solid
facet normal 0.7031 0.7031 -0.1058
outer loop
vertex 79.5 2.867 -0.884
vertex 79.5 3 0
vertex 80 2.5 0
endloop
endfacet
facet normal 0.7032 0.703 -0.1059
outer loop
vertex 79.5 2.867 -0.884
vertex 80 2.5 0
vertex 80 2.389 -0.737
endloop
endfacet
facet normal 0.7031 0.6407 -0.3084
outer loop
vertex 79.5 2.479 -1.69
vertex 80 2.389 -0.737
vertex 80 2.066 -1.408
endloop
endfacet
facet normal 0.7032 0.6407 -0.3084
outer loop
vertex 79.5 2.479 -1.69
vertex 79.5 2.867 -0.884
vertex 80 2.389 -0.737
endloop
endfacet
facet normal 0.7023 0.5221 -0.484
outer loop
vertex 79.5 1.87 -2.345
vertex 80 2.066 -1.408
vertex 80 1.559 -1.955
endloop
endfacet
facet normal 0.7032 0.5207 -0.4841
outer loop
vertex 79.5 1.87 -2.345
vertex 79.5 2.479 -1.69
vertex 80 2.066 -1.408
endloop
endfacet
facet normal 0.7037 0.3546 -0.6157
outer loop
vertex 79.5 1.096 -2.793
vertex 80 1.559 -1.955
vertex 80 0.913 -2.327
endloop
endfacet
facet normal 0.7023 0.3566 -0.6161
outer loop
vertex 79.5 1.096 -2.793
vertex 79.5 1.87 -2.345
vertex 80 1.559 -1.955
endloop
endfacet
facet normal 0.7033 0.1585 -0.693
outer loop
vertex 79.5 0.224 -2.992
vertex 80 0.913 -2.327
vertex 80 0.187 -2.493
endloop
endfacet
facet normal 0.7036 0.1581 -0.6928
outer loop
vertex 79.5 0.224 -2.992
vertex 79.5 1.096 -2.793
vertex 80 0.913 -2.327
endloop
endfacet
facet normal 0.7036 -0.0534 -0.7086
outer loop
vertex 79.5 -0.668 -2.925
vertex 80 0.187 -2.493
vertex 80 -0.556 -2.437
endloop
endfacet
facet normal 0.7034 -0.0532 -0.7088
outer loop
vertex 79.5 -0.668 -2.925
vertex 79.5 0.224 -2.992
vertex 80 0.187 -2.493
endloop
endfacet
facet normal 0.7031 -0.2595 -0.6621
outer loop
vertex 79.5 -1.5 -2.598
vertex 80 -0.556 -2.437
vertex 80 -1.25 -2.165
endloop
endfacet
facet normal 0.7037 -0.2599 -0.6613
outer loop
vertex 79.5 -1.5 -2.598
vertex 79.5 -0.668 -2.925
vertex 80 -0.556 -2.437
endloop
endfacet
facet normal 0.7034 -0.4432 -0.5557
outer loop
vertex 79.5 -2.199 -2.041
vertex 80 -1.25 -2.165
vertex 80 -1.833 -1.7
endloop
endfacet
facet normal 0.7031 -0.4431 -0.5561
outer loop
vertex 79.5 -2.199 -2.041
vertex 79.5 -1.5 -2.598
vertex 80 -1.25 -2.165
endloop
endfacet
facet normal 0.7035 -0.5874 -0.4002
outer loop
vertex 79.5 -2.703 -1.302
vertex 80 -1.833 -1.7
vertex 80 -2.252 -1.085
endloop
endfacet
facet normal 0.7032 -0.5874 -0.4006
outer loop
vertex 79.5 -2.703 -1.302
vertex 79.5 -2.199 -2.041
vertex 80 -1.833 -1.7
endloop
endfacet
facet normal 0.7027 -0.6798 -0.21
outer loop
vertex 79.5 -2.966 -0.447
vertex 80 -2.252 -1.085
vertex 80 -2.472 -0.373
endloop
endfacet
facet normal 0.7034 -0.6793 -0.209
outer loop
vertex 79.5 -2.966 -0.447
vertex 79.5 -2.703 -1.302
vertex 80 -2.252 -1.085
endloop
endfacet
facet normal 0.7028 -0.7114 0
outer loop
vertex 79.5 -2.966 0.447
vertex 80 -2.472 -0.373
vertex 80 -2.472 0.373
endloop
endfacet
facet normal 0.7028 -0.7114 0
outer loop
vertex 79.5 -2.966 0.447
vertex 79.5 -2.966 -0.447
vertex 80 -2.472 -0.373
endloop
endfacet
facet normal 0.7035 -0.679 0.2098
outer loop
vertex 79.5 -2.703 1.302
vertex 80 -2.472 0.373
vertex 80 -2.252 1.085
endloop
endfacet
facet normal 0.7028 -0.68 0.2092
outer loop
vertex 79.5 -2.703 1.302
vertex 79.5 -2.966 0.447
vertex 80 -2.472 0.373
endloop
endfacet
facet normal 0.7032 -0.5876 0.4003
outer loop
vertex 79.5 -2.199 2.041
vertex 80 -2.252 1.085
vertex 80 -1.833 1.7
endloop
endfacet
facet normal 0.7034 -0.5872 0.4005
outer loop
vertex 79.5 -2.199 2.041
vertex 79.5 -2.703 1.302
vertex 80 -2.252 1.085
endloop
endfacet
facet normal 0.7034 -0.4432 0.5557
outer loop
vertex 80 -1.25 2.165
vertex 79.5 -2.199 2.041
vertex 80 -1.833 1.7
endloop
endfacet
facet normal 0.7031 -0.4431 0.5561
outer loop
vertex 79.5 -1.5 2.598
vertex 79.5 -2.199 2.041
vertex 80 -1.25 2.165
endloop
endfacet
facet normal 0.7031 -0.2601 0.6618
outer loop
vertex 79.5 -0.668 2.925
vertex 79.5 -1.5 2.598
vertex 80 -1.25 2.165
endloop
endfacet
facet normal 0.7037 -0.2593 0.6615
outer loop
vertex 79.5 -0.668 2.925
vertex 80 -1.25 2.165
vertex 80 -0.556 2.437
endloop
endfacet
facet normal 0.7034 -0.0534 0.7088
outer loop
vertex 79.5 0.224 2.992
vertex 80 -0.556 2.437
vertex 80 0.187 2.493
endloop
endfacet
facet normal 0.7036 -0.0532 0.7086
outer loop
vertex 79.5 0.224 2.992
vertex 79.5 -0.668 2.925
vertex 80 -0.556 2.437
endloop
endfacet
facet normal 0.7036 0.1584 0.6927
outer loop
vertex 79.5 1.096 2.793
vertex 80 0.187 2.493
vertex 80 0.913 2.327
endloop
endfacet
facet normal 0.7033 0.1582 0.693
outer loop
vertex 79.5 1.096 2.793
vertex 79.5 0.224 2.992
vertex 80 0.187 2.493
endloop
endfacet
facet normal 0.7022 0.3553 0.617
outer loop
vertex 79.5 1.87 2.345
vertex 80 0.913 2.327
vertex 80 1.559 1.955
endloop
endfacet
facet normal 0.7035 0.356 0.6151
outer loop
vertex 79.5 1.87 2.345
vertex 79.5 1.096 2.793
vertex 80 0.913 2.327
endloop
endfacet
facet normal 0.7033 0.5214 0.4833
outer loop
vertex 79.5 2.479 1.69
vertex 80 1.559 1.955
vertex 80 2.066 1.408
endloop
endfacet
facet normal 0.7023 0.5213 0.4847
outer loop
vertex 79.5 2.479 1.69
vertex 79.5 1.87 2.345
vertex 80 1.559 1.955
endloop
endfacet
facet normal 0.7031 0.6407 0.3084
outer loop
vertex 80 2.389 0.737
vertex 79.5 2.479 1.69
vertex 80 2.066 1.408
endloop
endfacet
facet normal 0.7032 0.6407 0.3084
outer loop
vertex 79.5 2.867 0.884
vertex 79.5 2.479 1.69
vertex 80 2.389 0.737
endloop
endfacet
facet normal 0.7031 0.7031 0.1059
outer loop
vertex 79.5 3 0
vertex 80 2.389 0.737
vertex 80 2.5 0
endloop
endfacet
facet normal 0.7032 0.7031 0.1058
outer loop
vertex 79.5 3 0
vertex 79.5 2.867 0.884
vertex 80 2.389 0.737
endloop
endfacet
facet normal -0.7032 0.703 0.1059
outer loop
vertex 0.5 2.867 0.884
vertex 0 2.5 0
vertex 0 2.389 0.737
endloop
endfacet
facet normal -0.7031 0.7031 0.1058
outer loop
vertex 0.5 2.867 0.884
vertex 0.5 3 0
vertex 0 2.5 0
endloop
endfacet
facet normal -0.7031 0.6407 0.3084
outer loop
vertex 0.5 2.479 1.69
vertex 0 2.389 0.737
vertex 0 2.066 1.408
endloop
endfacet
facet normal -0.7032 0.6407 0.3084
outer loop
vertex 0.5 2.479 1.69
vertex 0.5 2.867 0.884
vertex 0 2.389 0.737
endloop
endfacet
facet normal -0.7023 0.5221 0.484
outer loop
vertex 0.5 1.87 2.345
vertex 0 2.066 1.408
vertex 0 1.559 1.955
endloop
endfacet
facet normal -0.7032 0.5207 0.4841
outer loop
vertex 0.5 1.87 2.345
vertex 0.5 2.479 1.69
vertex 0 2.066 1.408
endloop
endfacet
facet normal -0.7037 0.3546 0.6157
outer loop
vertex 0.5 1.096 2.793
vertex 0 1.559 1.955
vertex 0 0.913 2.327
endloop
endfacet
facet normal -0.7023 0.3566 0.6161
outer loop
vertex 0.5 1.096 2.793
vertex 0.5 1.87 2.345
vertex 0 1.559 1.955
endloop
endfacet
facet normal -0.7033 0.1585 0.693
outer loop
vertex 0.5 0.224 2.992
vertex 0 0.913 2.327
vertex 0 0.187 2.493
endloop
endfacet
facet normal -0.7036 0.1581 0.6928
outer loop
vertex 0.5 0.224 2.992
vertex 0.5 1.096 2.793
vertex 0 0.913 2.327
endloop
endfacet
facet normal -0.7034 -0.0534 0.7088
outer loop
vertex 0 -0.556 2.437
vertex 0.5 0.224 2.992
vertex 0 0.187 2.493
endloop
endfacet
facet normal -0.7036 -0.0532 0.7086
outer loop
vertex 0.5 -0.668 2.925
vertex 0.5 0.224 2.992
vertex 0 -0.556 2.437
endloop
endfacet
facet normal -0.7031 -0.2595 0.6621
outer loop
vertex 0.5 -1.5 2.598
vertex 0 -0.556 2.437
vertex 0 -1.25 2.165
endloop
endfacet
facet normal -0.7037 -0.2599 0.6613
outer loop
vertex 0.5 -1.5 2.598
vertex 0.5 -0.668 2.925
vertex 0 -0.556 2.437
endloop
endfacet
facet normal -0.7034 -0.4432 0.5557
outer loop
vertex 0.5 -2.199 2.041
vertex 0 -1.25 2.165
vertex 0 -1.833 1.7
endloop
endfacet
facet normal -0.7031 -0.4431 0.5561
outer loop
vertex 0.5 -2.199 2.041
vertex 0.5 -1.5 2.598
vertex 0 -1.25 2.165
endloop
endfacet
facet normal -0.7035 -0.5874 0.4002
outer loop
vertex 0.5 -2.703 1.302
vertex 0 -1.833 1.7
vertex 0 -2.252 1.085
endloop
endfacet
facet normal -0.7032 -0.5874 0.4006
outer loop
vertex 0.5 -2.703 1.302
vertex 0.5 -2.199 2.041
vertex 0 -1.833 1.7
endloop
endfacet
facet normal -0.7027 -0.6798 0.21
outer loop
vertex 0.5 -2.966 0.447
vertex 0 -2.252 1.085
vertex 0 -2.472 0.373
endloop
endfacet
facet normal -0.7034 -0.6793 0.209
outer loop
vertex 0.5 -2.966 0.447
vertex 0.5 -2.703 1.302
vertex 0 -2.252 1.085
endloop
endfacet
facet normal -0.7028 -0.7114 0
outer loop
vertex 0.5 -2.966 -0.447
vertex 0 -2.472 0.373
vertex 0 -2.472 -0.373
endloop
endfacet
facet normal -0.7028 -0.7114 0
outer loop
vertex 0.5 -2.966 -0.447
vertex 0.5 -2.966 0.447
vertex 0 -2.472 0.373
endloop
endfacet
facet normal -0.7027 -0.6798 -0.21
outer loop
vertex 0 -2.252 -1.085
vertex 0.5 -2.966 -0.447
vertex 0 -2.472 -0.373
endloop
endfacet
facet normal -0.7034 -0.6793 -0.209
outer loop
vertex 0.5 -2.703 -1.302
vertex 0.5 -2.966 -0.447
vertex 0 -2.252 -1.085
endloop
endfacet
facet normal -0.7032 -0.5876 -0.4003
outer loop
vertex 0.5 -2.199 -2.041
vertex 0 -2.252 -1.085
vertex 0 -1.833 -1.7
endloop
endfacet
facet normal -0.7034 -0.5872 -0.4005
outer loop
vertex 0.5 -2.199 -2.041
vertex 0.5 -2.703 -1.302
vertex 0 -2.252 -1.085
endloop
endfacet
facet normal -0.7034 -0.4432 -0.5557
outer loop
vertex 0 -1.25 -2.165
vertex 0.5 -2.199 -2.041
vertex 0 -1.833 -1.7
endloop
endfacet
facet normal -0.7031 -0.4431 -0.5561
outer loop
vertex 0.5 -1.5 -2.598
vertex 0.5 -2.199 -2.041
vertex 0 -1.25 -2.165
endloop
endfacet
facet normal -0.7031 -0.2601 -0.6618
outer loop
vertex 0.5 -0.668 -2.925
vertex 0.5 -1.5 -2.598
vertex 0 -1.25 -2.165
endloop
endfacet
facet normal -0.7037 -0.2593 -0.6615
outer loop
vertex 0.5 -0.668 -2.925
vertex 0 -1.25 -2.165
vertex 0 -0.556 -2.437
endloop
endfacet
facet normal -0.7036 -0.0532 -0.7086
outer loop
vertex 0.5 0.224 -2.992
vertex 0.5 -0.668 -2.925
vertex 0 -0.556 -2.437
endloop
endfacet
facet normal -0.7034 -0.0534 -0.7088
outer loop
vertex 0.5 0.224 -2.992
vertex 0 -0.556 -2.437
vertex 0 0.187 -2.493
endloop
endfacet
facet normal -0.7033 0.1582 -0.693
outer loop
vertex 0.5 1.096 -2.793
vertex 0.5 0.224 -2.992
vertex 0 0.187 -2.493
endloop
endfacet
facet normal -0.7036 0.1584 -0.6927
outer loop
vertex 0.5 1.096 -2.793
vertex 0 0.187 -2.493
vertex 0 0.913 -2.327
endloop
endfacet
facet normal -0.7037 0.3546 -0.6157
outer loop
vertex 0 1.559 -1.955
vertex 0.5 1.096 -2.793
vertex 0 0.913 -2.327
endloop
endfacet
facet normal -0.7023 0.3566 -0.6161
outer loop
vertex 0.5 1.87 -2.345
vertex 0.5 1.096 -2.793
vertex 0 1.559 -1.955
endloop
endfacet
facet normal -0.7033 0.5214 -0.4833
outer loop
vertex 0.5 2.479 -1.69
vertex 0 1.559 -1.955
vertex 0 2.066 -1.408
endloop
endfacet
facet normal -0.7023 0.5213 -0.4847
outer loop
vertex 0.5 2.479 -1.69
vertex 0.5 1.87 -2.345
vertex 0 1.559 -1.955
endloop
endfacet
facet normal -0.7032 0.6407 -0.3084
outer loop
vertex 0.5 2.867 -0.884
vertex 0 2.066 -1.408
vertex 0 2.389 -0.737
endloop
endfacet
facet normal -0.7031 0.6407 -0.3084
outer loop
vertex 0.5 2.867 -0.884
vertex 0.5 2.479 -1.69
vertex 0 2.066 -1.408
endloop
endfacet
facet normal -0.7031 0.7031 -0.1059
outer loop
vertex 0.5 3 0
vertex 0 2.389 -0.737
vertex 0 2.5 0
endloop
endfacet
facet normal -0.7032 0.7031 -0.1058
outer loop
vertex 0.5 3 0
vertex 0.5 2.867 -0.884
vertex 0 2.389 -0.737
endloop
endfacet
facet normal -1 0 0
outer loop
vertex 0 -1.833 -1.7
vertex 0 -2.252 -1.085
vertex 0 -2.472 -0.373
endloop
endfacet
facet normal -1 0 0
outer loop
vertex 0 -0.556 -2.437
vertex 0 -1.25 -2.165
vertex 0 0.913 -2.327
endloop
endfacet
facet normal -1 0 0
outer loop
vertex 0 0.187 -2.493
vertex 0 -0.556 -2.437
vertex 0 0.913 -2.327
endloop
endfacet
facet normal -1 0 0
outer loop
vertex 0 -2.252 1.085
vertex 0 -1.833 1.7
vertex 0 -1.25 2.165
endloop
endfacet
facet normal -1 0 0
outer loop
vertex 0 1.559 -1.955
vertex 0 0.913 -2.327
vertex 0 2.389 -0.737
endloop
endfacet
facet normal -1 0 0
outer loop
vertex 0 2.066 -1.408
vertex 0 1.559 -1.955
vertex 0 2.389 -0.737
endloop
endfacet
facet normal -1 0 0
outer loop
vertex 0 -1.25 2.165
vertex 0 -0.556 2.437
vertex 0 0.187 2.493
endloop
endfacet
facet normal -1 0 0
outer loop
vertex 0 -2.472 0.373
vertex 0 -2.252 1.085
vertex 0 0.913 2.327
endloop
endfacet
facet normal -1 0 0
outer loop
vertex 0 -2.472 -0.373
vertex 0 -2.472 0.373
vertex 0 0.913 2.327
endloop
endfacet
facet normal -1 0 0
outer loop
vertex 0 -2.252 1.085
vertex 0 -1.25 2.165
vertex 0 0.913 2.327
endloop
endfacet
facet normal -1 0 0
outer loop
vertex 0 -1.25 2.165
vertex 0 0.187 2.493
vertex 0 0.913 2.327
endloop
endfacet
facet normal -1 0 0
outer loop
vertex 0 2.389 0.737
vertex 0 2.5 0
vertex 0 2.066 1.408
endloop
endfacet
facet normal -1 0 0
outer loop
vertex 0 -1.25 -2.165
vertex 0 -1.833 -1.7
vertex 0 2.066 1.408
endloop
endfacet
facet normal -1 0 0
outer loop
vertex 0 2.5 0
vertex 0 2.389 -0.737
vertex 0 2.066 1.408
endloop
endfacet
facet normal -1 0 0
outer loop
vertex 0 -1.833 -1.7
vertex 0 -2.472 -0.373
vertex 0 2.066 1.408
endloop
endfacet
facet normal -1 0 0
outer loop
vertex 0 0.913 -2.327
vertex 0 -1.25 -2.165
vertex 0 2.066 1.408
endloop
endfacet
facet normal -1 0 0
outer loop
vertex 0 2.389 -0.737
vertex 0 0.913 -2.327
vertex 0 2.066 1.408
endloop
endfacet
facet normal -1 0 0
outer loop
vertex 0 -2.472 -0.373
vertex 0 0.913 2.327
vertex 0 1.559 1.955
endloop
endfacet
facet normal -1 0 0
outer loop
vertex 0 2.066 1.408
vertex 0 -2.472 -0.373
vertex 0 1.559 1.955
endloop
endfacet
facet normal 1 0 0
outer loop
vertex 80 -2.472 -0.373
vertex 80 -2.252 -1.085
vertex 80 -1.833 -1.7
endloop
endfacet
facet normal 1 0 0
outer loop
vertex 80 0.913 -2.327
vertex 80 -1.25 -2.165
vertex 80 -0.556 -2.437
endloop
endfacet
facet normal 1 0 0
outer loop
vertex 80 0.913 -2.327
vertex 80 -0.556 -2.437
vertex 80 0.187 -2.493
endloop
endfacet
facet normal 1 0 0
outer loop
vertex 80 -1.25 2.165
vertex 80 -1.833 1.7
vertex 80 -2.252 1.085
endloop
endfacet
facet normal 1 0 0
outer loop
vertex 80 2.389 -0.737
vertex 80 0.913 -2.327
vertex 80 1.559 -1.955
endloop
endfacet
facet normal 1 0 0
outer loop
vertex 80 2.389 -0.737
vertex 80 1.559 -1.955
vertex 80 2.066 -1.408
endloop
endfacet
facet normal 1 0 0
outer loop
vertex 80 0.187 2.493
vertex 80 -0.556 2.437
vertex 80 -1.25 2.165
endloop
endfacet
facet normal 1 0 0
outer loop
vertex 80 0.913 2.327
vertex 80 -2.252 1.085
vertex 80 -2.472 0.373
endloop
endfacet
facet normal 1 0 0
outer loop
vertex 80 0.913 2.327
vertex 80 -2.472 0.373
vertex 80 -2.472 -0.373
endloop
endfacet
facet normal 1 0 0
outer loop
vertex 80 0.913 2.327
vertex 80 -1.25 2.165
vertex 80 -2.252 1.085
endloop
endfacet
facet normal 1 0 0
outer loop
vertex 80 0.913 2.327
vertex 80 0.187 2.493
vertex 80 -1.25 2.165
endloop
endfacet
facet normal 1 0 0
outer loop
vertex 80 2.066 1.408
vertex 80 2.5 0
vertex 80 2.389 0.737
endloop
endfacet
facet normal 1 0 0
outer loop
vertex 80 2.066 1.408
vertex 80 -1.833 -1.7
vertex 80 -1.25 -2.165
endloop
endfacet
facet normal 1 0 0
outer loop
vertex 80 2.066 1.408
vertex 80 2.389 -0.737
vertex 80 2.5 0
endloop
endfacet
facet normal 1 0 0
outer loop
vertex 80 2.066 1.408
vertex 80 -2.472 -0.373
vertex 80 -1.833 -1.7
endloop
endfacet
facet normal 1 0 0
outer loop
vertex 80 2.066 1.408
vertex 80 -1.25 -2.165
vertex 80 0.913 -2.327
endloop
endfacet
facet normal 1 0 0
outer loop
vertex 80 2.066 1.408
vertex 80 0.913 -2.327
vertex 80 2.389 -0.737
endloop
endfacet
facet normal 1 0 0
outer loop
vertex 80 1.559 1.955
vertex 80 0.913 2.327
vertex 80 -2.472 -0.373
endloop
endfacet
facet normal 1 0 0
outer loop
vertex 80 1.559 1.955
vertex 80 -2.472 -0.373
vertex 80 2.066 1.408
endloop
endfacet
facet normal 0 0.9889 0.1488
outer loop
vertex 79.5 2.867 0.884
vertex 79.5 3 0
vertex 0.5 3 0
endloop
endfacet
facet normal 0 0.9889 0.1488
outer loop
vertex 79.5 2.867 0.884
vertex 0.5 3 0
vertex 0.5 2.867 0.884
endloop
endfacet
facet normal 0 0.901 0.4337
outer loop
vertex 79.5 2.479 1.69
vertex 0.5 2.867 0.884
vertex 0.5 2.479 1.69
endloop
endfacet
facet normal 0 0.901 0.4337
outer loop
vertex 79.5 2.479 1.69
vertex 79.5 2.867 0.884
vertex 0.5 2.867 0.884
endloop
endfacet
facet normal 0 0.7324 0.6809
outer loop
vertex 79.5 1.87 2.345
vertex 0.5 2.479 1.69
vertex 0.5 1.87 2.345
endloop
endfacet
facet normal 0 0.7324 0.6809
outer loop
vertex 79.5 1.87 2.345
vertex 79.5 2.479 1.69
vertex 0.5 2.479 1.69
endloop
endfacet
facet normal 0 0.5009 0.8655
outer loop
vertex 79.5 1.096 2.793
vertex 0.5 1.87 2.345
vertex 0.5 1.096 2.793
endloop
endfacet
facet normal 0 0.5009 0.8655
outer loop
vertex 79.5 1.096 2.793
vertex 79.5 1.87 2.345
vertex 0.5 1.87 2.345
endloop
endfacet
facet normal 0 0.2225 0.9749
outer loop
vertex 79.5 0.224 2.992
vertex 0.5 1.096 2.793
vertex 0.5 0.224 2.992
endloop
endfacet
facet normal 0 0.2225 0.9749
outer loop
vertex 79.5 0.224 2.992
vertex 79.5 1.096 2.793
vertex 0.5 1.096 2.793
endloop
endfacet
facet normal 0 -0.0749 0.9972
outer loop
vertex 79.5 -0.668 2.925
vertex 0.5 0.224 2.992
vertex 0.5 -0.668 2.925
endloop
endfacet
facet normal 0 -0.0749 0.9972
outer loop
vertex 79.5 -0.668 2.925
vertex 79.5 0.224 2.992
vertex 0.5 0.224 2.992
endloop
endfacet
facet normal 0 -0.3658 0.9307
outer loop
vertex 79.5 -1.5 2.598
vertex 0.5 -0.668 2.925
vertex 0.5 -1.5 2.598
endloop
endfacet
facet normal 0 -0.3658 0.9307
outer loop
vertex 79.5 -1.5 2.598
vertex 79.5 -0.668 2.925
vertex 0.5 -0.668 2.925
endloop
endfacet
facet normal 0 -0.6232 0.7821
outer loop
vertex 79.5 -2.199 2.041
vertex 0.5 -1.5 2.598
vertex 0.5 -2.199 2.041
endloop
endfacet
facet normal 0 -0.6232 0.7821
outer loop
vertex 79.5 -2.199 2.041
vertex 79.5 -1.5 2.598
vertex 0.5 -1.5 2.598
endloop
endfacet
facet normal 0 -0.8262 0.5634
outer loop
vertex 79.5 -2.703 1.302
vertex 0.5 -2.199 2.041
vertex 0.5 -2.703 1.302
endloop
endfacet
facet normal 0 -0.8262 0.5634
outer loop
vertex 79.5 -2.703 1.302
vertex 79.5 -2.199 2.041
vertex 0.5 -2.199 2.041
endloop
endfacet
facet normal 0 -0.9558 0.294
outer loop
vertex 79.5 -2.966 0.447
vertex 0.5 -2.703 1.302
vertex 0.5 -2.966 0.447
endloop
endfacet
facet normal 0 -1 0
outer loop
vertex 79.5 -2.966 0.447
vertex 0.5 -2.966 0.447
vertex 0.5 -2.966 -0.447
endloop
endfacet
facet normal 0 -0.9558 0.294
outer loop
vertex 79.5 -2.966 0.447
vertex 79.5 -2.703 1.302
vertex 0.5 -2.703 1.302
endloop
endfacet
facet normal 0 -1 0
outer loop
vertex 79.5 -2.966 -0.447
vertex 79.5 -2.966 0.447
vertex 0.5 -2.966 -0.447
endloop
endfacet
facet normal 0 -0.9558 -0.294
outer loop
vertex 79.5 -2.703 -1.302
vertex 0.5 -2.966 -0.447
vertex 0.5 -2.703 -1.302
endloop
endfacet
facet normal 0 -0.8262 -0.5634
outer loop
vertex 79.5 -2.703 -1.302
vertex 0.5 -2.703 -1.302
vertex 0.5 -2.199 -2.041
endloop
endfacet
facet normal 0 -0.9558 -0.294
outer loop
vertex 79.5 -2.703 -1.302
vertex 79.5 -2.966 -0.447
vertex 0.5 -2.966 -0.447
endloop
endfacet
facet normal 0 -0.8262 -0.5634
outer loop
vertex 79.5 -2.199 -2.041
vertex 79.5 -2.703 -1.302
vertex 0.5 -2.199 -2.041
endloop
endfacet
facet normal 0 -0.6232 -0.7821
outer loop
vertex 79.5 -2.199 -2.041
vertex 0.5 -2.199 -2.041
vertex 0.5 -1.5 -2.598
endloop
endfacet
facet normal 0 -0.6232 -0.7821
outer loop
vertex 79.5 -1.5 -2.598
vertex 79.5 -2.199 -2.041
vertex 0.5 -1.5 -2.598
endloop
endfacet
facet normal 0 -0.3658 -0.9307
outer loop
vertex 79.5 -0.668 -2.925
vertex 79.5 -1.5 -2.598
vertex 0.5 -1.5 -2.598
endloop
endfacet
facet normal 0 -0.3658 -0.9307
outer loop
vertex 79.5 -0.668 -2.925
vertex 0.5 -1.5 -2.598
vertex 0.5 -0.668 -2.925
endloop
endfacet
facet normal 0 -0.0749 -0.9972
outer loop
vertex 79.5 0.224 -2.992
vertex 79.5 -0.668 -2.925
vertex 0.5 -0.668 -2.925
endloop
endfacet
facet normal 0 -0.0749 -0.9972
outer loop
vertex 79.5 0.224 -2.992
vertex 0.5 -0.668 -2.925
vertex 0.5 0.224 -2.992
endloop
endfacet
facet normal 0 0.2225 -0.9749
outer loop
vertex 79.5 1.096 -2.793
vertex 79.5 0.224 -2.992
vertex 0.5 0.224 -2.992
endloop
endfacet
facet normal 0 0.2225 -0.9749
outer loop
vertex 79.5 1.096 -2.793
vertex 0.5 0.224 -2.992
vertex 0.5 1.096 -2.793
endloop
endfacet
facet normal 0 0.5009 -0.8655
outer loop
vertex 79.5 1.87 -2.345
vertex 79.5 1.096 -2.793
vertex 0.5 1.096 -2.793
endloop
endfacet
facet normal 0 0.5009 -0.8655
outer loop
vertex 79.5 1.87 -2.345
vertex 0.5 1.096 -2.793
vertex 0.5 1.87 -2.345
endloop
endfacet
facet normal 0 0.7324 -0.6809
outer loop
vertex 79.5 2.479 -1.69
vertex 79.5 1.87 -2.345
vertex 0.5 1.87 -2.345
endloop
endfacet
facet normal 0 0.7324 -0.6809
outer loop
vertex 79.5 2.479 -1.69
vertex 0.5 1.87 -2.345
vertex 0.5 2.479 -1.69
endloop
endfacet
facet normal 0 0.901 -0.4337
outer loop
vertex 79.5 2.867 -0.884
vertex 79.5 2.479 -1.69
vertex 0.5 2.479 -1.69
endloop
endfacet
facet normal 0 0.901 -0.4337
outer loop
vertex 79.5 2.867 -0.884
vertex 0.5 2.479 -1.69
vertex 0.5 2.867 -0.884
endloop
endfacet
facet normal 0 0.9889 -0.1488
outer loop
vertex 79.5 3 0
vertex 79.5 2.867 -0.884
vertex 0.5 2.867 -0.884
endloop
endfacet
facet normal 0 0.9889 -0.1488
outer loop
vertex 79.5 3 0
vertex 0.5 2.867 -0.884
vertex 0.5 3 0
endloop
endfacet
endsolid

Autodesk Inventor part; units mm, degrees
ref_plane "Start Plane" through (0, 0, 0) normal (1, 0, 0) x (0, 1, 0)
ref_plane "XZ Plane" through (0, 0, 0) normal (0, 1, 0) x (-1, 0, 0)
ref_plane "XY Plane" through (0, 0, 0) normal (0, 0, 1) x (1, 0, 0)
sketch "Main Sketch" plane through (0, 0, 0) normal (0, 0, 1) x (1, 0, 0)
  line L0 (0, 0) -> (80, 0)
  line L1 (0, 0) -> (0, 3)
  line L2 (80, 3) -> (80, 0)
  line L3 (0, 3) -> (80, 3)
  dimension "d3" = 6
revolve "Revolution1" add sketch "Main Sketch" angle 360 about axis through (0, 0, 0) along (1, 0, 0)
chamfer "Chamfer1" distance 0.5 angle 45 1 edges at (0, -3, 0) measured on face at (53.3333, 2.9612, -0.4812)
chamfer "Chamfer2" distance 0.5 angle 45 1 edges at (80, -3, 0) measured on face at (53.5, 2.9903, -0.2414)
properties part number "Shaft" material "Steel"
